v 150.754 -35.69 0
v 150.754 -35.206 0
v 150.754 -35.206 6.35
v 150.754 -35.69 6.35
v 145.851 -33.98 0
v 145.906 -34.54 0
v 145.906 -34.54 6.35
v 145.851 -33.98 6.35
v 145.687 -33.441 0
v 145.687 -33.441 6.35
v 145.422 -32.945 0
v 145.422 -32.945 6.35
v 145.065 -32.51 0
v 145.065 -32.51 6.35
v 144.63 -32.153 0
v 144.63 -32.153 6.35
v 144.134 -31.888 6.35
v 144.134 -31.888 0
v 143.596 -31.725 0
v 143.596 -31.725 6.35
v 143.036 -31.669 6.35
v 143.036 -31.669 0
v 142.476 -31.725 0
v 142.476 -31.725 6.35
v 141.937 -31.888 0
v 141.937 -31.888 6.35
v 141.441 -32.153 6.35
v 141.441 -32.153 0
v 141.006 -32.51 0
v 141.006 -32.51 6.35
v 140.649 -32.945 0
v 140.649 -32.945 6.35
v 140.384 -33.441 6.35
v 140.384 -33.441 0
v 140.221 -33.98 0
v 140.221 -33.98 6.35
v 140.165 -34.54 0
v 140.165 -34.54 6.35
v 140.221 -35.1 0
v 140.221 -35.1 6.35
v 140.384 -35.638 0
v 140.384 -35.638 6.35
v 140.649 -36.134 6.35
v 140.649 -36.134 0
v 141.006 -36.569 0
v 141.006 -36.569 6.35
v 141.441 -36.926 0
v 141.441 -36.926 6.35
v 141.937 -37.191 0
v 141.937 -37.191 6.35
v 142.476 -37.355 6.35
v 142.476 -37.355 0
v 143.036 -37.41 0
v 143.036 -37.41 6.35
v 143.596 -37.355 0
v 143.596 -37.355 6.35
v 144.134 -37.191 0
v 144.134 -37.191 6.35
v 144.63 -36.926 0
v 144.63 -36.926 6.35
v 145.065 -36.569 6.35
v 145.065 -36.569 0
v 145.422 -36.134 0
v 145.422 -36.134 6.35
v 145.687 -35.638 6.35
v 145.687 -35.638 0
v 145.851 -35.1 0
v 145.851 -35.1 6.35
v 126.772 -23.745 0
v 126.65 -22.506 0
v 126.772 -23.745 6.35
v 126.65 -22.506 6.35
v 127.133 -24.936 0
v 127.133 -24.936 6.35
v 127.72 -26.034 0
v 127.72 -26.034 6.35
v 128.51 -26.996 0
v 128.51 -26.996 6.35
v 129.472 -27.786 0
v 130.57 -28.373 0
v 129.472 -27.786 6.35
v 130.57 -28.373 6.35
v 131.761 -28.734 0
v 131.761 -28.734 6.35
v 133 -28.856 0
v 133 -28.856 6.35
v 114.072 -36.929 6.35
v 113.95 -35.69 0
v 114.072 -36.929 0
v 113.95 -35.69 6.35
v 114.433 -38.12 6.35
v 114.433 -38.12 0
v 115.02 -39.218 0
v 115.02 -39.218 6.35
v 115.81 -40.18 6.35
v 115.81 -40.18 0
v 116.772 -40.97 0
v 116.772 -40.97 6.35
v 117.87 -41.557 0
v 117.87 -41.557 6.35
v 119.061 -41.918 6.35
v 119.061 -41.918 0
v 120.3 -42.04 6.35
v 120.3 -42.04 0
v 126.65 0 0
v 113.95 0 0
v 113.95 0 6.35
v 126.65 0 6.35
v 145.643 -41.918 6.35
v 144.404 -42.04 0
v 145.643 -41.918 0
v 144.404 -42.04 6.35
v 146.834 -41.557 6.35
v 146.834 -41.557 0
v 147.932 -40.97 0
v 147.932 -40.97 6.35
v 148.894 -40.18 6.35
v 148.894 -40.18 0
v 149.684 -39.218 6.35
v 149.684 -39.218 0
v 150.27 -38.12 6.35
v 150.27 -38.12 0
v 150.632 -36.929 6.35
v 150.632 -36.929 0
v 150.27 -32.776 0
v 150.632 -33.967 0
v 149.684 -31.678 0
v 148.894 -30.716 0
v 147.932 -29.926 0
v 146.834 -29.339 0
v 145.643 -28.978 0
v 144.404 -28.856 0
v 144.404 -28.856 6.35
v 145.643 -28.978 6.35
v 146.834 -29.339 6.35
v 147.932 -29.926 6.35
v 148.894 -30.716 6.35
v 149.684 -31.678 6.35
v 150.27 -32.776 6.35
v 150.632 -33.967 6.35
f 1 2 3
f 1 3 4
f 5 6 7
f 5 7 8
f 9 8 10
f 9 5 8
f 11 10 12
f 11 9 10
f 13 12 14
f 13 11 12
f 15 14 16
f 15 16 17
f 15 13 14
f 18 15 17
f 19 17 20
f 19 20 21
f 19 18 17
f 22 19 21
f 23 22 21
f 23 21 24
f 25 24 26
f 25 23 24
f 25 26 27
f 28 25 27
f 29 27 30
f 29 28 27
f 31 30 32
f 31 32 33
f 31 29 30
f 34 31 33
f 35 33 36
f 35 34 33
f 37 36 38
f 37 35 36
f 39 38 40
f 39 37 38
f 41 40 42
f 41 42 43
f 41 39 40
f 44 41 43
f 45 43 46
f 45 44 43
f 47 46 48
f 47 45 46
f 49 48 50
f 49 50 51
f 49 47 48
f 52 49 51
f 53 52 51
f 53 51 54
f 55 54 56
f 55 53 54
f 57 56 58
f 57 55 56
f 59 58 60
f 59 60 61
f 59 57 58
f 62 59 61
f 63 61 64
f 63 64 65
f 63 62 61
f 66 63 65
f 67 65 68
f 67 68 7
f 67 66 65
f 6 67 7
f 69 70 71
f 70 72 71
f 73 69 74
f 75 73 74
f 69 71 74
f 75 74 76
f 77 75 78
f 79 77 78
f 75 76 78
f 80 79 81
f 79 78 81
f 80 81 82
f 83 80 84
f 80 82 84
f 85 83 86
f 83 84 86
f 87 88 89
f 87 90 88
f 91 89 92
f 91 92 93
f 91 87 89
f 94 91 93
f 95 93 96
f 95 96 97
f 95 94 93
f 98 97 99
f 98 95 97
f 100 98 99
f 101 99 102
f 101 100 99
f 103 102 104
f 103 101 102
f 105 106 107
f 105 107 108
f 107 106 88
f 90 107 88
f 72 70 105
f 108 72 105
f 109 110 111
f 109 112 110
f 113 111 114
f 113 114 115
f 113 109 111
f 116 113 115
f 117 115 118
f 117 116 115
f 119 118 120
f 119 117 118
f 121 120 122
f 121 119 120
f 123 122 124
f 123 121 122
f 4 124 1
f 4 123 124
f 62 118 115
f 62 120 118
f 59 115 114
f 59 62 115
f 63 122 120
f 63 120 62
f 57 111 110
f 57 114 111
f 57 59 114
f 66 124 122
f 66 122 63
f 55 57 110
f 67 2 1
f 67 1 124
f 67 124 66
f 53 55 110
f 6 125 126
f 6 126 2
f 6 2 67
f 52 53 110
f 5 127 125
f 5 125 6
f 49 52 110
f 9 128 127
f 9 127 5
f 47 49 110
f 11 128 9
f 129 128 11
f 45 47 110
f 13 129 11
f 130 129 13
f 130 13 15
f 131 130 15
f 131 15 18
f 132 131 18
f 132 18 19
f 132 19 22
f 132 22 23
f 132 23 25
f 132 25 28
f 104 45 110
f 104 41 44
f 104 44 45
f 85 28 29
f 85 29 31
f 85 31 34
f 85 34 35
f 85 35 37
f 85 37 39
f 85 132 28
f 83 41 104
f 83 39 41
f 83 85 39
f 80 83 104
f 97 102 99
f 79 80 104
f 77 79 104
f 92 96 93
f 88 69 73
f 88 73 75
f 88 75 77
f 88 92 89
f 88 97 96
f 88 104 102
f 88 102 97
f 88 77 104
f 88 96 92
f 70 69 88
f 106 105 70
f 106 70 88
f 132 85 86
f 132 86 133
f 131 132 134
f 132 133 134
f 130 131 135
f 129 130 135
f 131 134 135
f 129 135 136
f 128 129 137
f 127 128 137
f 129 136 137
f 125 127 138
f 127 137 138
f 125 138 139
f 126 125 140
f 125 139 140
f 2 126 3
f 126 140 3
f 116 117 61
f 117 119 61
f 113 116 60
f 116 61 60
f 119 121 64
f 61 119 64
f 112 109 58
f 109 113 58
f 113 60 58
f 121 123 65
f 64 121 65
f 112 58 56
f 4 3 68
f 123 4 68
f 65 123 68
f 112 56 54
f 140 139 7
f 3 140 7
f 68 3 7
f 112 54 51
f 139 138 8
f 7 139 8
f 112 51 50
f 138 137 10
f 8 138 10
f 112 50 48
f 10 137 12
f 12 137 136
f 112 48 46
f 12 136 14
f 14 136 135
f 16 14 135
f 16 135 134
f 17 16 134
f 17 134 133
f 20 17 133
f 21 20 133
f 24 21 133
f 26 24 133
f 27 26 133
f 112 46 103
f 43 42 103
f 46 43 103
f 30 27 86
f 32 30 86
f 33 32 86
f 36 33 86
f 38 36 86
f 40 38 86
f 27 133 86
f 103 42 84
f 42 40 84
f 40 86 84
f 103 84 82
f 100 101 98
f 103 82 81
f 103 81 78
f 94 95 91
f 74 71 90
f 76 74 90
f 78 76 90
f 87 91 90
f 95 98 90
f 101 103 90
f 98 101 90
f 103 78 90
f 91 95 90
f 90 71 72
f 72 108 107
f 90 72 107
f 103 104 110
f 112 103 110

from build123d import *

# Parameters (mm, degrees)
SKETCH1_R           = 2.8702
BOSS_EXTRUDE1_DEPTH = 6.35
FILLET1_R           = 6.35


with BuildPart() as part:
    # Sketch1 → Boss-Extrude1 (new body)
    with BuildSketch(Plane.XY):
        Polygon((113.949884677, 0), (126.649884677, 0), (126.649884677, -6.35), (126.649884677, -28.855984936), (150.753776805, -28.855984936), (150.753776805, -42.040179878), (126.649884677, -42.040179878), (113.949884677, -42.040179878), (113.949884677, -6.35), align=None)
        with Locations((143.035641266, -34.539684717)):
            Circle(SKETCH1_R, mode=Mode.SUBTRACT)
    extrude(amount=BOSS_EXTRUDE1_DEPTH)

    # Fillet1
    fillet1_edges = [part.edges().sort_by_distance(p)[0] for p in [
        (126.649884677, -28.855984936, 3.175),
        (150.753776805, -28.855984936, 3.175),
        (150.753776805, -42.040179878, 3.175),
        (113.949884677, -42.040179878, 3.175),
    ]]
    fillet(fillet1_edges, radius=FILLET1_R)


solid = part.part
